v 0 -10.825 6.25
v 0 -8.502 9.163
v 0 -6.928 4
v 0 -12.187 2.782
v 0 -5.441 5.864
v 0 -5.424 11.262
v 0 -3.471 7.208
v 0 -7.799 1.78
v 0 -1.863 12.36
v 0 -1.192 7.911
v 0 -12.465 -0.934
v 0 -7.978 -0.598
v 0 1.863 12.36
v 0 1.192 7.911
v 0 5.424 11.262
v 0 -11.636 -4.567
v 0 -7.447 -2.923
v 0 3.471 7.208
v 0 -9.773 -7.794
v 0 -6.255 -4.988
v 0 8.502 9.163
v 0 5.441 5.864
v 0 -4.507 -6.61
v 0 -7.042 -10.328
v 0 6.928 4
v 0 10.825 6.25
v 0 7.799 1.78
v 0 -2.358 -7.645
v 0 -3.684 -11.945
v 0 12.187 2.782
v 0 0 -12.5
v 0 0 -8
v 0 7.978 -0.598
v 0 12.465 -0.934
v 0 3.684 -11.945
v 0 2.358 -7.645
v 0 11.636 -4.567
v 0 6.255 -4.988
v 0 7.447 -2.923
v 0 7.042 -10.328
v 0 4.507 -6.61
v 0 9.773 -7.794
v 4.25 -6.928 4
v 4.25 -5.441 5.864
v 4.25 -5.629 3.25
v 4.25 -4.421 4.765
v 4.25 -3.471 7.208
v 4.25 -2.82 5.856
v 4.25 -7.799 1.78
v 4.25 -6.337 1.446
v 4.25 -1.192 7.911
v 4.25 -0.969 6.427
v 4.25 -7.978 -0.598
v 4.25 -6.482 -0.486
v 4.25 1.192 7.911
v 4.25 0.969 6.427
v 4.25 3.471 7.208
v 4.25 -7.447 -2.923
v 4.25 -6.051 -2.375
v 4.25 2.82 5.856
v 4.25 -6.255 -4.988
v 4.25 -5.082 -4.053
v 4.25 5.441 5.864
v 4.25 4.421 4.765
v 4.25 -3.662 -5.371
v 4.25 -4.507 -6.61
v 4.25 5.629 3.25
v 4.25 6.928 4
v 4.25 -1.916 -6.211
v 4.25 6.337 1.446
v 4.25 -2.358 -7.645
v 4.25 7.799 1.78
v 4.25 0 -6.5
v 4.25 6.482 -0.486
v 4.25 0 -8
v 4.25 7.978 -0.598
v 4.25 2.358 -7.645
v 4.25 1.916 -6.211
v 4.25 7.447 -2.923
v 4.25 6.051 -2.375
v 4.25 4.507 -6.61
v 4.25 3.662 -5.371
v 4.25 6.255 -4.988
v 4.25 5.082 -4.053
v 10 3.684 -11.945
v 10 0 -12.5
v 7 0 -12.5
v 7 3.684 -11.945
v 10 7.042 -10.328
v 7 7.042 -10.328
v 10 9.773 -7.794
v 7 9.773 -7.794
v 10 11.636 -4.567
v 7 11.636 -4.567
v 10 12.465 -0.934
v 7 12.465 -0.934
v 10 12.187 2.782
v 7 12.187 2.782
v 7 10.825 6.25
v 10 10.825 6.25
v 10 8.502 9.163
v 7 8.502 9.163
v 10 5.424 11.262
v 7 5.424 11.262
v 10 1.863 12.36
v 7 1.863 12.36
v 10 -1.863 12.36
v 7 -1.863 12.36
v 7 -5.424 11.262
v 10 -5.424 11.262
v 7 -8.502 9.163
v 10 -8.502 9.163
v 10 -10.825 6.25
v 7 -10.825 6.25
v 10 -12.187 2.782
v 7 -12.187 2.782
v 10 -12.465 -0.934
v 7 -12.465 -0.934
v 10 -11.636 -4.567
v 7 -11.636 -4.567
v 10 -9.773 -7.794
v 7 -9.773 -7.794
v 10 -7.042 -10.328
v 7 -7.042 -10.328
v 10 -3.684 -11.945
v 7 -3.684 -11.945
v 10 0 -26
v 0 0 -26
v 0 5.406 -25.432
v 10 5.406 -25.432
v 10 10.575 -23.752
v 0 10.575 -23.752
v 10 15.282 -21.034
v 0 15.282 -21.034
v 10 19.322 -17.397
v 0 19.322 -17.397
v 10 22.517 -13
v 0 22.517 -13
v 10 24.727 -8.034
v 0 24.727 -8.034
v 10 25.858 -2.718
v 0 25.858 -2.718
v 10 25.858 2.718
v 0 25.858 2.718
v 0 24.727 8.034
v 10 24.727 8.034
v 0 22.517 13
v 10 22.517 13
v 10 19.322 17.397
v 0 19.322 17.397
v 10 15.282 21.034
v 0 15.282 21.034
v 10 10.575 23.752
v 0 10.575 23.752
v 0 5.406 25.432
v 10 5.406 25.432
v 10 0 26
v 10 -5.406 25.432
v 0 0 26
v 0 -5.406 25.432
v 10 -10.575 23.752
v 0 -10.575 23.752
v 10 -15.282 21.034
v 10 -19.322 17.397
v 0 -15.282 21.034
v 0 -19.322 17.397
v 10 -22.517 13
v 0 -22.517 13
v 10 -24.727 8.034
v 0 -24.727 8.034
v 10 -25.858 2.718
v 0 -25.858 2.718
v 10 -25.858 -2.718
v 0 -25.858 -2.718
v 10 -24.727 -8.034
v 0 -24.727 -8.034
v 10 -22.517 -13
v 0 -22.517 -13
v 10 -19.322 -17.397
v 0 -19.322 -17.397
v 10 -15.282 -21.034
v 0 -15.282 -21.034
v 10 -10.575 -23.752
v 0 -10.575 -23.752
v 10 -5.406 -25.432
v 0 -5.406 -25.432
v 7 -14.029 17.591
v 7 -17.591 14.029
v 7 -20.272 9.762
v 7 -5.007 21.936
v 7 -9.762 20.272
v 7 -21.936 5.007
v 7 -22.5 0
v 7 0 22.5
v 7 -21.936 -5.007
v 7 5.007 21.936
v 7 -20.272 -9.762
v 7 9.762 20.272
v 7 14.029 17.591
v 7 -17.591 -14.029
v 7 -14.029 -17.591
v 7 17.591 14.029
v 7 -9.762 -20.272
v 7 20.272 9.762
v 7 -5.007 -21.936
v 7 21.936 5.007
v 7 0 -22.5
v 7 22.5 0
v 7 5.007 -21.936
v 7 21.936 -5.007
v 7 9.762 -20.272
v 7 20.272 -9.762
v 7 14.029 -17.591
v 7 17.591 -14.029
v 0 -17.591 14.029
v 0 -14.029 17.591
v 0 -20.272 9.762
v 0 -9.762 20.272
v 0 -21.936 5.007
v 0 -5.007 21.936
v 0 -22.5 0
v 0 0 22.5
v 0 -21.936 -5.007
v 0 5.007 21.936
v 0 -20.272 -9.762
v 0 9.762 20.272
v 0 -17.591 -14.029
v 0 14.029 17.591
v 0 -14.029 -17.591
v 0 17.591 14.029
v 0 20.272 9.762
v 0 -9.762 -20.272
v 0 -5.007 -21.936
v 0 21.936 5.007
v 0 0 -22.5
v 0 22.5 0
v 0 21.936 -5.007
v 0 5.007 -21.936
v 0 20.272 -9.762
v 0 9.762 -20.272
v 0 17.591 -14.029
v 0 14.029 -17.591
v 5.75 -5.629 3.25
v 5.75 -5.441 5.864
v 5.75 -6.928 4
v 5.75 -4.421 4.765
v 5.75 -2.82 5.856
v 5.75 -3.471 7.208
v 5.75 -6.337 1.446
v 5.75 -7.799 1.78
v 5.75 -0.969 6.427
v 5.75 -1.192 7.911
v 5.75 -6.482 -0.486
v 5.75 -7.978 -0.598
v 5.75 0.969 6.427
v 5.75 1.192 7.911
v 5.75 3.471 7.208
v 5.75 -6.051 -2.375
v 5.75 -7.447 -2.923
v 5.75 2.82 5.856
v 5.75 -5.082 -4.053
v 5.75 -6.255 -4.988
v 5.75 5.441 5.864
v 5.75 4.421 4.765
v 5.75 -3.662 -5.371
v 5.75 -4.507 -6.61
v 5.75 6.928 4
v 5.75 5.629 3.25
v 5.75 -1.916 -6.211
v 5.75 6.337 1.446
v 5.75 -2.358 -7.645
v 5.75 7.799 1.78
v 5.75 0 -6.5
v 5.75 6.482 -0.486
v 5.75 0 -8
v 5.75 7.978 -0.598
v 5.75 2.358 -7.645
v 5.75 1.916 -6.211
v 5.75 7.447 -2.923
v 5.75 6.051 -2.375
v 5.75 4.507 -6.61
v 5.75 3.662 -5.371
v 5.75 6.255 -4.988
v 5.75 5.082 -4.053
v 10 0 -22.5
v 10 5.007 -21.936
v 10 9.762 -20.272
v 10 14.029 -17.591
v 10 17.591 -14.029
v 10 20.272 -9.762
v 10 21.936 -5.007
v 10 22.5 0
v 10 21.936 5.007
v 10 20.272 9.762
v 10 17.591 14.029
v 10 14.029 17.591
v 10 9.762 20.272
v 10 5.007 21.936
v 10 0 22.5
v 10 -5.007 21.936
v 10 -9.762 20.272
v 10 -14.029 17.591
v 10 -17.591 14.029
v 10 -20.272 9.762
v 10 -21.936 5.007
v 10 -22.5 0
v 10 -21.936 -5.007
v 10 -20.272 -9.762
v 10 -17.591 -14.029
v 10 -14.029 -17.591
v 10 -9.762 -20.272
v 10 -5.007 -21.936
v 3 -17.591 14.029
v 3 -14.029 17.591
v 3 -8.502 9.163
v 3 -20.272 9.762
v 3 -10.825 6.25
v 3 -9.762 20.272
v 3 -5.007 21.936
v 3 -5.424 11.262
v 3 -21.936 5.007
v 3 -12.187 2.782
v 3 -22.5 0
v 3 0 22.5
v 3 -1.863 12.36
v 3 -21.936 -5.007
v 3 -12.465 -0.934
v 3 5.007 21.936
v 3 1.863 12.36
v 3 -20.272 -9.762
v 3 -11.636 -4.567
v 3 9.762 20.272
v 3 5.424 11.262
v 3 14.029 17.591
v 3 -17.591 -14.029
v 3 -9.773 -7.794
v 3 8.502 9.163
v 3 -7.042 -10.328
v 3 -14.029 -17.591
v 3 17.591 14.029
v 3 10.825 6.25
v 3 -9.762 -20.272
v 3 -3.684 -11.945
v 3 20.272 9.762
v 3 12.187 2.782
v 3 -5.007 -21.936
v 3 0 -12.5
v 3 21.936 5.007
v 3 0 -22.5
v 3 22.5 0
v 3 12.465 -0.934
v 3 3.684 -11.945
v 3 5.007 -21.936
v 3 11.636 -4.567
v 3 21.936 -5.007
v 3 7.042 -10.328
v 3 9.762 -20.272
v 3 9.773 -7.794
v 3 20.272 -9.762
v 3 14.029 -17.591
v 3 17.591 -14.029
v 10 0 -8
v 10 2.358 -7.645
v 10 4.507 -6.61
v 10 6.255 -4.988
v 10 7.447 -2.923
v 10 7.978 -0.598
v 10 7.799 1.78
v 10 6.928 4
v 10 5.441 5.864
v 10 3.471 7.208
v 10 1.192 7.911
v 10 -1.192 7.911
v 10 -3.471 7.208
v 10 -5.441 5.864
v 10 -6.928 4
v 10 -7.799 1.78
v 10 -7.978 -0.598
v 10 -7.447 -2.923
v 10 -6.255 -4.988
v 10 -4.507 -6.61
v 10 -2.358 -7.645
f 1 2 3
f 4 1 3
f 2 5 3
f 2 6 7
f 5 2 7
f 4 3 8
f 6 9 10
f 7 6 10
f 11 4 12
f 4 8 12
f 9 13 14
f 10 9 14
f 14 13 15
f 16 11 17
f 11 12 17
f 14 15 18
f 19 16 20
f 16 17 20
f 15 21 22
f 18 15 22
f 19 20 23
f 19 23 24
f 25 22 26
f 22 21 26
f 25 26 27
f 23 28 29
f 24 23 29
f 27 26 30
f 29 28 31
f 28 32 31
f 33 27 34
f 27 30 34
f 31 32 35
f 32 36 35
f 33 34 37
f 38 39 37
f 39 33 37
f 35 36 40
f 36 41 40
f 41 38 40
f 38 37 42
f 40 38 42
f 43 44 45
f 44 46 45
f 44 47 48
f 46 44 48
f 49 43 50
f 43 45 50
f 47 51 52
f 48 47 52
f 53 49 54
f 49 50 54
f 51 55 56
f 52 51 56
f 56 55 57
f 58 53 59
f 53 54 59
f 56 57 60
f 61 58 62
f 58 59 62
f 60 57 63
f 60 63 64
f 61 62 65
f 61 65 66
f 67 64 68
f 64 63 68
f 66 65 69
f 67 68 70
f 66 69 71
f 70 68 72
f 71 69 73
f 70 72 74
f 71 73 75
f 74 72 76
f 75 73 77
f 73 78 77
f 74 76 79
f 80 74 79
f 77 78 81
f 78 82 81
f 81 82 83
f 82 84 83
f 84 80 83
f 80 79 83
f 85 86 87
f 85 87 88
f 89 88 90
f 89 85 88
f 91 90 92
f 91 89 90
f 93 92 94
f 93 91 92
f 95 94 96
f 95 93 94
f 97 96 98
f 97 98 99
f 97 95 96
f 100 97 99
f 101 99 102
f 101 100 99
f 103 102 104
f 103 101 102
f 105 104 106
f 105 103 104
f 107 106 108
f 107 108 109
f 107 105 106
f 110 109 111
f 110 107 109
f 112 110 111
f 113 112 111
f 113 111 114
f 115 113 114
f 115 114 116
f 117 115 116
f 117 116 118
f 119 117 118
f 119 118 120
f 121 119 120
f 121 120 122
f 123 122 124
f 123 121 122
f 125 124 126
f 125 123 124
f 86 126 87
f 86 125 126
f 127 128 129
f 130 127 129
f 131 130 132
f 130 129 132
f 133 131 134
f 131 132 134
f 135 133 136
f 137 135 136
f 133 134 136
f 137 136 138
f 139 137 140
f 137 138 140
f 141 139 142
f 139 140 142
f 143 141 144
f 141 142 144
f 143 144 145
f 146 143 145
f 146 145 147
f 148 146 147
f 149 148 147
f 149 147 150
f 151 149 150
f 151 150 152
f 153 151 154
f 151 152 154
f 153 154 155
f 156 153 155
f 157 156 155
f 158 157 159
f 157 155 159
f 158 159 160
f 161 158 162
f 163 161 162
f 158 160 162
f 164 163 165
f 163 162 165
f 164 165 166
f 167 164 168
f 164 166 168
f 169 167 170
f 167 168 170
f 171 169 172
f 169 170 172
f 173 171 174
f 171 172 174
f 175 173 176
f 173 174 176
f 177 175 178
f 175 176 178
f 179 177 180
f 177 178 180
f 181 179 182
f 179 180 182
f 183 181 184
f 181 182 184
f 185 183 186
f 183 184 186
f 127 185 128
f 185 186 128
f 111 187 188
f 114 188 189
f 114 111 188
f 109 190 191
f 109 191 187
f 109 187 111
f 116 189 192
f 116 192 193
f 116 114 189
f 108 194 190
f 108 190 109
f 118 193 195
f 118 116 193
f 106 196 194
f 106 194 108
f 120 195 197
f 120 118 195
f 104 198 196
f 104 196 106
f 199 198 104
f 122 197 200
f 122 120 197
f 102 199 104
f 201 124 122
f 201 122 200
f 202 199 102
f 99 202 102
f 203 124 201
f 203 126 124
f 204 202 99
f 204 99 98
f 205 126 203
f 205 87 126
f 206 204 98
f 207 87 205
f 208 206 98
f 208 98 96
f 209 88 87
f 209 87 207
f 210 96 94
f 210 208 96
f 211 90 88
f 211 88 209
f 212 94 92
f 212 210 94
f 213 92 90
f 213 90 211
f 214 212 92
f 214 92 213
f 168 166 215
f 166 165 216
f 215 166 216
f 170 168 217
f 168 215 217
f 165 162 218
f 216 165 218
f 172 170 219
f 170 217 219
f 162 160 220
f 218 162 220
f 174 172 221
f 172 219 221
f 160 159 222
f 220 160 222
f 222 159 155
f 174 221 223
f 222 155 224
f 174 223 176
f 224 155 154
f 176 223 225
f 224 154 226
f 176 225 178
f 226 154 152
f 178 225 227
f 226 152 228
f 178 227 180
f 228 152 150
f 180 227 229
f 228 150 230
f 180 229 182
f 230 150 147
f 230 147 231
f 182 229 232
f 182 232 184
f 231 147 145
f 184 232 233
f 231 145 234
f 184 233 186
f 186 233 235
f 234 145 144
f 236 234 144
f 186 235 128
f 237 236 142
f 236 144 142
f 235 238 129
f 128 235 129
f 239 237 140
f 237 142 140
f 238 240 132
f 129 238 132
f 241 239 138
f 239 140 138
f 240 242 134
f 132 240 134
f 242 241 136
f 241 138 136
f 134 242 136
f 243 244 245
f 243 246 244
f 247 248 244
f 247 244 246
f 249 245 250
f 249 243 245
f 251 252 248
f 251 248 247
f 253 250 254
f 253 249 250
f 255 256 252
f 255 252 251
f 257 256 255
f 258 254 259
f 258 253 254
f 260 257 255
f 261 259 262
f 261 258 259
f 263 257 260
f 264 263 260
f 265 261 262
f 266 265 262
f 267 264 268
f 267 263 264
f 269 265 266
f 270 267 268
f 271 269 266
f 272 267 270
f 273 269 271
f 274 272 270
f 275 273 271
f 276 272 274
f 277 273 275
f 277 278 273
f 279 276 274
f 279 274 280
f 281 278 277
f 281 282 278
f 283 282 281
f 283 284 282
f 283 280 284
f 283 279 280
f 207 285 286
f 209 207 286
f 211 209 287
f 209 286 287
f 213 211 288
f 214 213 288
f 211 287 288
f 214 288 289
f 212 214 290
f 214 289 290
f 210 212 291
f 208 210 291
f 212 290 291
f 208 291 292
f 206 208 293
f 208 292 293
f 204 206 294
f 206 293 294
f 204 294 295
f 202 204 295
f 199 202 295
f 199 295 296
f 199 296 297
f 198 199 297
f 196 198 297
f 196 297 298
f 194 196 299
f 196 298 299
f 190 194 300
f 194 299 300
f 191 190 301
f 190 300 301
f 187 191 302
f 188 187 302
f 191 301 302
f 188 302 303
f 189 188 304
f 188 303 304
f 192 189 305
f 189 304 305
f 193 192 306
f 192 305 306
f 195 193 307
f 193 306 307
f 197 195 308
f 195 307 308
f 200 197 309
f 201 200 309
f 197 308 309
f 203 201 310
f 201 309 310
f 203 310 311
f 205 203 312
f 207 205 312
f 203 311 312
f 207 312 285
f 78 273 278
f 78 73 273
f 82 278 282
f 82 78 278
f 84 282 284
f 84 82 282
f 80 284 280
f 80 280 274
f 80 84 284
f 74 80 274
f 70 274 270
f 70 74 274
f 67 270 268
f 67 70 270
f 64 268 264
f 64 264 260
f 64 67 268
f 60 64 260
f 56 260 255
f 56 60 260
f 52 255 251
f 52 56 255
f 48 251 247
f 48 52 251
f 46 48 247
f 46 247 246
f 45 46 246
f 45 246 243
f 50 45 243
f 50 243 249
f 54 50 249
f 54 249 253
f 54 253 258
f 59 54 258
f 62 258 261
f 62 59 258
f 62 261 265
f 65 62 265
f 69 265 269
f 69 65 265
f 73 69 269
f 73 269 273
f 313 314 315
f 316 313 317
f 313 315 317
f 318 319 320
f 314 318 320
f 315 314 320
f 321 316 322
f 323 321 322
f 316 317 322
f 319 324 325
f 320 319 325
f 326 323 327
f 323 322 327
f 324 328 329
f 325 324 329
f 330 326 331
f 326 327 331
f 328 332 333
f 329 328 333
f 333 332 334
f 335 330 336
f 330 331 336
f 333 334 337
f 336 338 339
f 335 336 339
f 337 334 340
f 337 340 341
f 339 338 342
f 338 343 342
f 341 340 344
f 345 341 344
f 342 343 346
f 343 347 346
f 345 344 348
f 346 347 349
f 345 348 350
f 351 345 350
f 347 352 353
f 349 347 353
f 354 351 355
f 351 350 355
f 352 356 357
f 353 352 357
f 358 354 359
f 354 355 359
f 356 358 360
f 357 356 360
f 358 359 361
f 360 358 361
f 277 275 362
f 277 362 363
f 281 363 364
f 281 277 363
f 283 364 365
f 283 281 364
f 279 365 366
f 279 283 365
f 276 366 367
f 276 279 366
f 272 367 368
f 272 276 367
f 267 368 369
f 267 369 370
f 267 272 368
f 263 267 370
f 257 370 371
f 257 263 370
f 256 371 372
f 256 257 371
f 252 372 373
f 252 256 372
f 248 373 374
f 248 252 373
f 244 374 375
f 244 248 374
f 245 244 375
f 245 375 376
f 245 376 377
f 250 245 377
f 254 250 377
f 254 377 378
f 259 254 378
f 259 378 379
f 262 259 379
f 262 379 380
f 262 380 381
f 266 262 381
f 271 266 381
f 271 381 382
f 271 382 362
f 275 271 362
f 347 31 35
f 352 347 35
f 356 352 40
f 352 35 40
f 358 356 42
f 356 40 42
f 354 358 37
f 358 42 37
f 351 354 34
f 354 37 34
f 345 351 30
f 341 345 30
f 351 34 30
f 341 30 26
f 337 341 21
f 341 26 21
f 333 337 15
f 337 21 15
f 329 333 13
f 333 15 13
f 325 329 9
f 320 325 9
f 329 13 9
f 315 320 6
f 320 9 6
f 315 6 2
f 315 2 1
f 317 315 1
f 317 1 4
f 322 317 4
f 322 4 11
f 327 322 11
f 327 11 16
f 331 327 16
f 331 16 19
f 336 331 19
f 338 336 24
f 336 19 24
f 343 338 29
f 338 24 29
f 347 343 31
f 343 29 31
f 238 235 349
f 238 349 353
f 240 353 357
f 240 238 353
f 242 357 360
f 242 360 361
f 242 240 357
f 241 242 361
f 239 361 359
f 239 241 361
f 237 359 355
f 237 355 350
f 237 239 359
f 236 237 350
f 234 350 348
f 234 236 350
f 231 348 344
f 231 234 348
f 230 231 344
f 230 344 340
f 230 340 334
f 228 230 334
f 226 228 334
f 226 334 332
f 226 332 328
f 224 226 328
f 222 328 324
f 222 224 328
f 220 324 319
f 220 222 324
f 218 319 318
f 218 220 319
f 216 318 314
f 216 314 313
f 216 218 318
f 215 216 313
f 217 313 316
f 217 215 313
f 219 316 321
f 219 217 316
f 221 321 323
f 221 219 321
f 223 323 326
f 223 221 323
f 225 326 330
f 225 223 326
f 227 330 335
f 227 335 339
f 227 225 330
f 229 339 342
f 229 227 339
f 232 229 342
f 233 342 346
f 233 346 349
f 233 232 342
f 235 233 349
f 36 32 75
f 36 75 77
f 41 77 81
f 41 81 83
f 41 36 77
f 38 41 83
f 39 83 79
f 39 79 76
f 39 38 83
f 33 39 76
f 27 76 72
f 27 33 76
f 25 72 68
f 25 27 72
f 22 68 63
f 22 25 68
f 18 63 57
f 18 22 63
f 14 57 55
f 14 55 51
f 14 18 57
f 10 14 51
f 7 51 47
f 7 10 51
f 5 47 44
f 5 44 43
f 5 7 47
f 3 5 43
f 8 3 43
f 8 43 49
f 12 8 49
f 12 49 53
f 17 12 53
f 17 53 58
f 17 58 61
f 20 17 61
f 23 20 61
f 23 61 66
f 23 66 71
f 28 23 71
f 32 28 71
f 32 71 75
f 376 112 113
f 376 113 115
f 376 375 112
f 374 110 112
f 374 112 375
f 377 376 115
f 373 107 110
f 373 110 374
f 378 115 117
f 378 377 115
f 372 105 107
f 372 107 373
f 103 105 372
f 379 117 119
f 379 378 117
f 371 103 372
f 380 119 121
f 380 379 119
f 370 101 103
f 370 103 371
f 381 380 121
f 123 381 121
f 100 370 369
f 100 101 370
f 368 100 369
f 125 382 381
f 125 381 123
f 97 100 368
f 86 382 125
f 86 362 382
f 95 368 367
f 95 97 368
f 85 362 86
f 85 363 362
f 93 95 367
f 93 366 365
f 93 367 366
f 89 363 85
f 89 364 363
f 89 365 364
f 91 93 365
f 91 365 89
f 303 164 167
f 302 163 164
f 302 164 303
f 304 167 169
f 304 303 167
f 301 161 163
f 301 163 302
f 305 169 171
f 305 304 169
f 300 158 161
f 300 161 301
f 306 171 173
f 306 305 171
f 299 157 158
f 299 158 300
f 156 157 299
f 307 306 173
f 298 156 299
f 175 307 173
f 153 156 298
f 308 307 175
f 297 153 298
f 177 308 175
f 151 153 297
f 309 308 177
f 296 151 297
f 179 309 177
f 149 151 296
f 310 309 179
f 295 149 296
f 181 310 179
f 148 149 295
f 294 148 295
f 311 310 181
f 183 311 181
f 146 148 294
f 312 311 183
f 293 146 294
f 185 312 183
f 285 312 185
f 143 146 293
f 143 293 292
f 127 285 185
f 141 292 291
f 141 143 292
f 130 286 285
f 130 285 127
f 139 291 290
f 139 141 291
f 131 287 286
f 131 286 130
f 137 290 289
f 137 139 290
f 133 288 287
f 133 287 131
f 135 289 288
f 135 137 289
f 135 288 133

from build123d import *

# Parameters (mm, degrees)
SKETCH1_R           = 26
SKETCH1_R_2         = 8
BOSS_EXTRUDE1_DEPTH = 10
SKETCH2_R           = 8
SKETCH2_R_2         = 6.5
BOSS_EXTRUDE2_DEPTH = 0.75
SKETCH3_R           = 22.5
SKETCH3_R_2         = 12.5
CUT_EXTRUDE1_DEPTH  = 3


with BuildPart() as part:
    # Sketch1 → Boss-Extrude1 (new body)
    with BuildSketch(Plane(origin=(0, 0, 0), x_dir=(0, 0, -1), z_dir=(1, 0, 0))):
        Circle(SKETCH1_R)
        Circle(SKETCH1_R_2, mode=Mode.SUBTRACT)
    extrude(amount=BOSS_EXTRUDE1_DEPTH)

    # Sketch2 → Boss-Extrude2 (add, symmetric)
    with BuildSketch(Plane(origin=(5, 0, 0), x_dir=(0, 0, -1), z_dir=(1, 0, 0))):
        Circle(SKETCH2_R)
        Circle(SKETCH2_R_2, mode=Mode.SUBTRACT)
    extrude(amount=BOSS_EXTRUDE2_DEPTH, both=True)

    # Sketch3 → Cut-Extrude1 (cut)
    with BuildSketch(Plane(origin=(10, 0, 0), x_dir=(0, 0, -1), z_dir=(1, 0, 0))):
        Circle(SKETCH3_R)
        Circle(SKETCH3_R_2, mode=Mode.SUBTRACT)
    cut_extrude1 = extrude(amount=-CUT_EXTRUDE1_DEPTH, mode=Mode.SUBTRACT)

    # Mirror1: Cut-Extrude1 across plane
    add(cut_extrude1.mirror(Plane(origin=(5, 0, 0), x_dir=(0, 0, 1), z_dir=(1, 0, 0))), mode=Mode.SUBTRACT)


solid = part.part
